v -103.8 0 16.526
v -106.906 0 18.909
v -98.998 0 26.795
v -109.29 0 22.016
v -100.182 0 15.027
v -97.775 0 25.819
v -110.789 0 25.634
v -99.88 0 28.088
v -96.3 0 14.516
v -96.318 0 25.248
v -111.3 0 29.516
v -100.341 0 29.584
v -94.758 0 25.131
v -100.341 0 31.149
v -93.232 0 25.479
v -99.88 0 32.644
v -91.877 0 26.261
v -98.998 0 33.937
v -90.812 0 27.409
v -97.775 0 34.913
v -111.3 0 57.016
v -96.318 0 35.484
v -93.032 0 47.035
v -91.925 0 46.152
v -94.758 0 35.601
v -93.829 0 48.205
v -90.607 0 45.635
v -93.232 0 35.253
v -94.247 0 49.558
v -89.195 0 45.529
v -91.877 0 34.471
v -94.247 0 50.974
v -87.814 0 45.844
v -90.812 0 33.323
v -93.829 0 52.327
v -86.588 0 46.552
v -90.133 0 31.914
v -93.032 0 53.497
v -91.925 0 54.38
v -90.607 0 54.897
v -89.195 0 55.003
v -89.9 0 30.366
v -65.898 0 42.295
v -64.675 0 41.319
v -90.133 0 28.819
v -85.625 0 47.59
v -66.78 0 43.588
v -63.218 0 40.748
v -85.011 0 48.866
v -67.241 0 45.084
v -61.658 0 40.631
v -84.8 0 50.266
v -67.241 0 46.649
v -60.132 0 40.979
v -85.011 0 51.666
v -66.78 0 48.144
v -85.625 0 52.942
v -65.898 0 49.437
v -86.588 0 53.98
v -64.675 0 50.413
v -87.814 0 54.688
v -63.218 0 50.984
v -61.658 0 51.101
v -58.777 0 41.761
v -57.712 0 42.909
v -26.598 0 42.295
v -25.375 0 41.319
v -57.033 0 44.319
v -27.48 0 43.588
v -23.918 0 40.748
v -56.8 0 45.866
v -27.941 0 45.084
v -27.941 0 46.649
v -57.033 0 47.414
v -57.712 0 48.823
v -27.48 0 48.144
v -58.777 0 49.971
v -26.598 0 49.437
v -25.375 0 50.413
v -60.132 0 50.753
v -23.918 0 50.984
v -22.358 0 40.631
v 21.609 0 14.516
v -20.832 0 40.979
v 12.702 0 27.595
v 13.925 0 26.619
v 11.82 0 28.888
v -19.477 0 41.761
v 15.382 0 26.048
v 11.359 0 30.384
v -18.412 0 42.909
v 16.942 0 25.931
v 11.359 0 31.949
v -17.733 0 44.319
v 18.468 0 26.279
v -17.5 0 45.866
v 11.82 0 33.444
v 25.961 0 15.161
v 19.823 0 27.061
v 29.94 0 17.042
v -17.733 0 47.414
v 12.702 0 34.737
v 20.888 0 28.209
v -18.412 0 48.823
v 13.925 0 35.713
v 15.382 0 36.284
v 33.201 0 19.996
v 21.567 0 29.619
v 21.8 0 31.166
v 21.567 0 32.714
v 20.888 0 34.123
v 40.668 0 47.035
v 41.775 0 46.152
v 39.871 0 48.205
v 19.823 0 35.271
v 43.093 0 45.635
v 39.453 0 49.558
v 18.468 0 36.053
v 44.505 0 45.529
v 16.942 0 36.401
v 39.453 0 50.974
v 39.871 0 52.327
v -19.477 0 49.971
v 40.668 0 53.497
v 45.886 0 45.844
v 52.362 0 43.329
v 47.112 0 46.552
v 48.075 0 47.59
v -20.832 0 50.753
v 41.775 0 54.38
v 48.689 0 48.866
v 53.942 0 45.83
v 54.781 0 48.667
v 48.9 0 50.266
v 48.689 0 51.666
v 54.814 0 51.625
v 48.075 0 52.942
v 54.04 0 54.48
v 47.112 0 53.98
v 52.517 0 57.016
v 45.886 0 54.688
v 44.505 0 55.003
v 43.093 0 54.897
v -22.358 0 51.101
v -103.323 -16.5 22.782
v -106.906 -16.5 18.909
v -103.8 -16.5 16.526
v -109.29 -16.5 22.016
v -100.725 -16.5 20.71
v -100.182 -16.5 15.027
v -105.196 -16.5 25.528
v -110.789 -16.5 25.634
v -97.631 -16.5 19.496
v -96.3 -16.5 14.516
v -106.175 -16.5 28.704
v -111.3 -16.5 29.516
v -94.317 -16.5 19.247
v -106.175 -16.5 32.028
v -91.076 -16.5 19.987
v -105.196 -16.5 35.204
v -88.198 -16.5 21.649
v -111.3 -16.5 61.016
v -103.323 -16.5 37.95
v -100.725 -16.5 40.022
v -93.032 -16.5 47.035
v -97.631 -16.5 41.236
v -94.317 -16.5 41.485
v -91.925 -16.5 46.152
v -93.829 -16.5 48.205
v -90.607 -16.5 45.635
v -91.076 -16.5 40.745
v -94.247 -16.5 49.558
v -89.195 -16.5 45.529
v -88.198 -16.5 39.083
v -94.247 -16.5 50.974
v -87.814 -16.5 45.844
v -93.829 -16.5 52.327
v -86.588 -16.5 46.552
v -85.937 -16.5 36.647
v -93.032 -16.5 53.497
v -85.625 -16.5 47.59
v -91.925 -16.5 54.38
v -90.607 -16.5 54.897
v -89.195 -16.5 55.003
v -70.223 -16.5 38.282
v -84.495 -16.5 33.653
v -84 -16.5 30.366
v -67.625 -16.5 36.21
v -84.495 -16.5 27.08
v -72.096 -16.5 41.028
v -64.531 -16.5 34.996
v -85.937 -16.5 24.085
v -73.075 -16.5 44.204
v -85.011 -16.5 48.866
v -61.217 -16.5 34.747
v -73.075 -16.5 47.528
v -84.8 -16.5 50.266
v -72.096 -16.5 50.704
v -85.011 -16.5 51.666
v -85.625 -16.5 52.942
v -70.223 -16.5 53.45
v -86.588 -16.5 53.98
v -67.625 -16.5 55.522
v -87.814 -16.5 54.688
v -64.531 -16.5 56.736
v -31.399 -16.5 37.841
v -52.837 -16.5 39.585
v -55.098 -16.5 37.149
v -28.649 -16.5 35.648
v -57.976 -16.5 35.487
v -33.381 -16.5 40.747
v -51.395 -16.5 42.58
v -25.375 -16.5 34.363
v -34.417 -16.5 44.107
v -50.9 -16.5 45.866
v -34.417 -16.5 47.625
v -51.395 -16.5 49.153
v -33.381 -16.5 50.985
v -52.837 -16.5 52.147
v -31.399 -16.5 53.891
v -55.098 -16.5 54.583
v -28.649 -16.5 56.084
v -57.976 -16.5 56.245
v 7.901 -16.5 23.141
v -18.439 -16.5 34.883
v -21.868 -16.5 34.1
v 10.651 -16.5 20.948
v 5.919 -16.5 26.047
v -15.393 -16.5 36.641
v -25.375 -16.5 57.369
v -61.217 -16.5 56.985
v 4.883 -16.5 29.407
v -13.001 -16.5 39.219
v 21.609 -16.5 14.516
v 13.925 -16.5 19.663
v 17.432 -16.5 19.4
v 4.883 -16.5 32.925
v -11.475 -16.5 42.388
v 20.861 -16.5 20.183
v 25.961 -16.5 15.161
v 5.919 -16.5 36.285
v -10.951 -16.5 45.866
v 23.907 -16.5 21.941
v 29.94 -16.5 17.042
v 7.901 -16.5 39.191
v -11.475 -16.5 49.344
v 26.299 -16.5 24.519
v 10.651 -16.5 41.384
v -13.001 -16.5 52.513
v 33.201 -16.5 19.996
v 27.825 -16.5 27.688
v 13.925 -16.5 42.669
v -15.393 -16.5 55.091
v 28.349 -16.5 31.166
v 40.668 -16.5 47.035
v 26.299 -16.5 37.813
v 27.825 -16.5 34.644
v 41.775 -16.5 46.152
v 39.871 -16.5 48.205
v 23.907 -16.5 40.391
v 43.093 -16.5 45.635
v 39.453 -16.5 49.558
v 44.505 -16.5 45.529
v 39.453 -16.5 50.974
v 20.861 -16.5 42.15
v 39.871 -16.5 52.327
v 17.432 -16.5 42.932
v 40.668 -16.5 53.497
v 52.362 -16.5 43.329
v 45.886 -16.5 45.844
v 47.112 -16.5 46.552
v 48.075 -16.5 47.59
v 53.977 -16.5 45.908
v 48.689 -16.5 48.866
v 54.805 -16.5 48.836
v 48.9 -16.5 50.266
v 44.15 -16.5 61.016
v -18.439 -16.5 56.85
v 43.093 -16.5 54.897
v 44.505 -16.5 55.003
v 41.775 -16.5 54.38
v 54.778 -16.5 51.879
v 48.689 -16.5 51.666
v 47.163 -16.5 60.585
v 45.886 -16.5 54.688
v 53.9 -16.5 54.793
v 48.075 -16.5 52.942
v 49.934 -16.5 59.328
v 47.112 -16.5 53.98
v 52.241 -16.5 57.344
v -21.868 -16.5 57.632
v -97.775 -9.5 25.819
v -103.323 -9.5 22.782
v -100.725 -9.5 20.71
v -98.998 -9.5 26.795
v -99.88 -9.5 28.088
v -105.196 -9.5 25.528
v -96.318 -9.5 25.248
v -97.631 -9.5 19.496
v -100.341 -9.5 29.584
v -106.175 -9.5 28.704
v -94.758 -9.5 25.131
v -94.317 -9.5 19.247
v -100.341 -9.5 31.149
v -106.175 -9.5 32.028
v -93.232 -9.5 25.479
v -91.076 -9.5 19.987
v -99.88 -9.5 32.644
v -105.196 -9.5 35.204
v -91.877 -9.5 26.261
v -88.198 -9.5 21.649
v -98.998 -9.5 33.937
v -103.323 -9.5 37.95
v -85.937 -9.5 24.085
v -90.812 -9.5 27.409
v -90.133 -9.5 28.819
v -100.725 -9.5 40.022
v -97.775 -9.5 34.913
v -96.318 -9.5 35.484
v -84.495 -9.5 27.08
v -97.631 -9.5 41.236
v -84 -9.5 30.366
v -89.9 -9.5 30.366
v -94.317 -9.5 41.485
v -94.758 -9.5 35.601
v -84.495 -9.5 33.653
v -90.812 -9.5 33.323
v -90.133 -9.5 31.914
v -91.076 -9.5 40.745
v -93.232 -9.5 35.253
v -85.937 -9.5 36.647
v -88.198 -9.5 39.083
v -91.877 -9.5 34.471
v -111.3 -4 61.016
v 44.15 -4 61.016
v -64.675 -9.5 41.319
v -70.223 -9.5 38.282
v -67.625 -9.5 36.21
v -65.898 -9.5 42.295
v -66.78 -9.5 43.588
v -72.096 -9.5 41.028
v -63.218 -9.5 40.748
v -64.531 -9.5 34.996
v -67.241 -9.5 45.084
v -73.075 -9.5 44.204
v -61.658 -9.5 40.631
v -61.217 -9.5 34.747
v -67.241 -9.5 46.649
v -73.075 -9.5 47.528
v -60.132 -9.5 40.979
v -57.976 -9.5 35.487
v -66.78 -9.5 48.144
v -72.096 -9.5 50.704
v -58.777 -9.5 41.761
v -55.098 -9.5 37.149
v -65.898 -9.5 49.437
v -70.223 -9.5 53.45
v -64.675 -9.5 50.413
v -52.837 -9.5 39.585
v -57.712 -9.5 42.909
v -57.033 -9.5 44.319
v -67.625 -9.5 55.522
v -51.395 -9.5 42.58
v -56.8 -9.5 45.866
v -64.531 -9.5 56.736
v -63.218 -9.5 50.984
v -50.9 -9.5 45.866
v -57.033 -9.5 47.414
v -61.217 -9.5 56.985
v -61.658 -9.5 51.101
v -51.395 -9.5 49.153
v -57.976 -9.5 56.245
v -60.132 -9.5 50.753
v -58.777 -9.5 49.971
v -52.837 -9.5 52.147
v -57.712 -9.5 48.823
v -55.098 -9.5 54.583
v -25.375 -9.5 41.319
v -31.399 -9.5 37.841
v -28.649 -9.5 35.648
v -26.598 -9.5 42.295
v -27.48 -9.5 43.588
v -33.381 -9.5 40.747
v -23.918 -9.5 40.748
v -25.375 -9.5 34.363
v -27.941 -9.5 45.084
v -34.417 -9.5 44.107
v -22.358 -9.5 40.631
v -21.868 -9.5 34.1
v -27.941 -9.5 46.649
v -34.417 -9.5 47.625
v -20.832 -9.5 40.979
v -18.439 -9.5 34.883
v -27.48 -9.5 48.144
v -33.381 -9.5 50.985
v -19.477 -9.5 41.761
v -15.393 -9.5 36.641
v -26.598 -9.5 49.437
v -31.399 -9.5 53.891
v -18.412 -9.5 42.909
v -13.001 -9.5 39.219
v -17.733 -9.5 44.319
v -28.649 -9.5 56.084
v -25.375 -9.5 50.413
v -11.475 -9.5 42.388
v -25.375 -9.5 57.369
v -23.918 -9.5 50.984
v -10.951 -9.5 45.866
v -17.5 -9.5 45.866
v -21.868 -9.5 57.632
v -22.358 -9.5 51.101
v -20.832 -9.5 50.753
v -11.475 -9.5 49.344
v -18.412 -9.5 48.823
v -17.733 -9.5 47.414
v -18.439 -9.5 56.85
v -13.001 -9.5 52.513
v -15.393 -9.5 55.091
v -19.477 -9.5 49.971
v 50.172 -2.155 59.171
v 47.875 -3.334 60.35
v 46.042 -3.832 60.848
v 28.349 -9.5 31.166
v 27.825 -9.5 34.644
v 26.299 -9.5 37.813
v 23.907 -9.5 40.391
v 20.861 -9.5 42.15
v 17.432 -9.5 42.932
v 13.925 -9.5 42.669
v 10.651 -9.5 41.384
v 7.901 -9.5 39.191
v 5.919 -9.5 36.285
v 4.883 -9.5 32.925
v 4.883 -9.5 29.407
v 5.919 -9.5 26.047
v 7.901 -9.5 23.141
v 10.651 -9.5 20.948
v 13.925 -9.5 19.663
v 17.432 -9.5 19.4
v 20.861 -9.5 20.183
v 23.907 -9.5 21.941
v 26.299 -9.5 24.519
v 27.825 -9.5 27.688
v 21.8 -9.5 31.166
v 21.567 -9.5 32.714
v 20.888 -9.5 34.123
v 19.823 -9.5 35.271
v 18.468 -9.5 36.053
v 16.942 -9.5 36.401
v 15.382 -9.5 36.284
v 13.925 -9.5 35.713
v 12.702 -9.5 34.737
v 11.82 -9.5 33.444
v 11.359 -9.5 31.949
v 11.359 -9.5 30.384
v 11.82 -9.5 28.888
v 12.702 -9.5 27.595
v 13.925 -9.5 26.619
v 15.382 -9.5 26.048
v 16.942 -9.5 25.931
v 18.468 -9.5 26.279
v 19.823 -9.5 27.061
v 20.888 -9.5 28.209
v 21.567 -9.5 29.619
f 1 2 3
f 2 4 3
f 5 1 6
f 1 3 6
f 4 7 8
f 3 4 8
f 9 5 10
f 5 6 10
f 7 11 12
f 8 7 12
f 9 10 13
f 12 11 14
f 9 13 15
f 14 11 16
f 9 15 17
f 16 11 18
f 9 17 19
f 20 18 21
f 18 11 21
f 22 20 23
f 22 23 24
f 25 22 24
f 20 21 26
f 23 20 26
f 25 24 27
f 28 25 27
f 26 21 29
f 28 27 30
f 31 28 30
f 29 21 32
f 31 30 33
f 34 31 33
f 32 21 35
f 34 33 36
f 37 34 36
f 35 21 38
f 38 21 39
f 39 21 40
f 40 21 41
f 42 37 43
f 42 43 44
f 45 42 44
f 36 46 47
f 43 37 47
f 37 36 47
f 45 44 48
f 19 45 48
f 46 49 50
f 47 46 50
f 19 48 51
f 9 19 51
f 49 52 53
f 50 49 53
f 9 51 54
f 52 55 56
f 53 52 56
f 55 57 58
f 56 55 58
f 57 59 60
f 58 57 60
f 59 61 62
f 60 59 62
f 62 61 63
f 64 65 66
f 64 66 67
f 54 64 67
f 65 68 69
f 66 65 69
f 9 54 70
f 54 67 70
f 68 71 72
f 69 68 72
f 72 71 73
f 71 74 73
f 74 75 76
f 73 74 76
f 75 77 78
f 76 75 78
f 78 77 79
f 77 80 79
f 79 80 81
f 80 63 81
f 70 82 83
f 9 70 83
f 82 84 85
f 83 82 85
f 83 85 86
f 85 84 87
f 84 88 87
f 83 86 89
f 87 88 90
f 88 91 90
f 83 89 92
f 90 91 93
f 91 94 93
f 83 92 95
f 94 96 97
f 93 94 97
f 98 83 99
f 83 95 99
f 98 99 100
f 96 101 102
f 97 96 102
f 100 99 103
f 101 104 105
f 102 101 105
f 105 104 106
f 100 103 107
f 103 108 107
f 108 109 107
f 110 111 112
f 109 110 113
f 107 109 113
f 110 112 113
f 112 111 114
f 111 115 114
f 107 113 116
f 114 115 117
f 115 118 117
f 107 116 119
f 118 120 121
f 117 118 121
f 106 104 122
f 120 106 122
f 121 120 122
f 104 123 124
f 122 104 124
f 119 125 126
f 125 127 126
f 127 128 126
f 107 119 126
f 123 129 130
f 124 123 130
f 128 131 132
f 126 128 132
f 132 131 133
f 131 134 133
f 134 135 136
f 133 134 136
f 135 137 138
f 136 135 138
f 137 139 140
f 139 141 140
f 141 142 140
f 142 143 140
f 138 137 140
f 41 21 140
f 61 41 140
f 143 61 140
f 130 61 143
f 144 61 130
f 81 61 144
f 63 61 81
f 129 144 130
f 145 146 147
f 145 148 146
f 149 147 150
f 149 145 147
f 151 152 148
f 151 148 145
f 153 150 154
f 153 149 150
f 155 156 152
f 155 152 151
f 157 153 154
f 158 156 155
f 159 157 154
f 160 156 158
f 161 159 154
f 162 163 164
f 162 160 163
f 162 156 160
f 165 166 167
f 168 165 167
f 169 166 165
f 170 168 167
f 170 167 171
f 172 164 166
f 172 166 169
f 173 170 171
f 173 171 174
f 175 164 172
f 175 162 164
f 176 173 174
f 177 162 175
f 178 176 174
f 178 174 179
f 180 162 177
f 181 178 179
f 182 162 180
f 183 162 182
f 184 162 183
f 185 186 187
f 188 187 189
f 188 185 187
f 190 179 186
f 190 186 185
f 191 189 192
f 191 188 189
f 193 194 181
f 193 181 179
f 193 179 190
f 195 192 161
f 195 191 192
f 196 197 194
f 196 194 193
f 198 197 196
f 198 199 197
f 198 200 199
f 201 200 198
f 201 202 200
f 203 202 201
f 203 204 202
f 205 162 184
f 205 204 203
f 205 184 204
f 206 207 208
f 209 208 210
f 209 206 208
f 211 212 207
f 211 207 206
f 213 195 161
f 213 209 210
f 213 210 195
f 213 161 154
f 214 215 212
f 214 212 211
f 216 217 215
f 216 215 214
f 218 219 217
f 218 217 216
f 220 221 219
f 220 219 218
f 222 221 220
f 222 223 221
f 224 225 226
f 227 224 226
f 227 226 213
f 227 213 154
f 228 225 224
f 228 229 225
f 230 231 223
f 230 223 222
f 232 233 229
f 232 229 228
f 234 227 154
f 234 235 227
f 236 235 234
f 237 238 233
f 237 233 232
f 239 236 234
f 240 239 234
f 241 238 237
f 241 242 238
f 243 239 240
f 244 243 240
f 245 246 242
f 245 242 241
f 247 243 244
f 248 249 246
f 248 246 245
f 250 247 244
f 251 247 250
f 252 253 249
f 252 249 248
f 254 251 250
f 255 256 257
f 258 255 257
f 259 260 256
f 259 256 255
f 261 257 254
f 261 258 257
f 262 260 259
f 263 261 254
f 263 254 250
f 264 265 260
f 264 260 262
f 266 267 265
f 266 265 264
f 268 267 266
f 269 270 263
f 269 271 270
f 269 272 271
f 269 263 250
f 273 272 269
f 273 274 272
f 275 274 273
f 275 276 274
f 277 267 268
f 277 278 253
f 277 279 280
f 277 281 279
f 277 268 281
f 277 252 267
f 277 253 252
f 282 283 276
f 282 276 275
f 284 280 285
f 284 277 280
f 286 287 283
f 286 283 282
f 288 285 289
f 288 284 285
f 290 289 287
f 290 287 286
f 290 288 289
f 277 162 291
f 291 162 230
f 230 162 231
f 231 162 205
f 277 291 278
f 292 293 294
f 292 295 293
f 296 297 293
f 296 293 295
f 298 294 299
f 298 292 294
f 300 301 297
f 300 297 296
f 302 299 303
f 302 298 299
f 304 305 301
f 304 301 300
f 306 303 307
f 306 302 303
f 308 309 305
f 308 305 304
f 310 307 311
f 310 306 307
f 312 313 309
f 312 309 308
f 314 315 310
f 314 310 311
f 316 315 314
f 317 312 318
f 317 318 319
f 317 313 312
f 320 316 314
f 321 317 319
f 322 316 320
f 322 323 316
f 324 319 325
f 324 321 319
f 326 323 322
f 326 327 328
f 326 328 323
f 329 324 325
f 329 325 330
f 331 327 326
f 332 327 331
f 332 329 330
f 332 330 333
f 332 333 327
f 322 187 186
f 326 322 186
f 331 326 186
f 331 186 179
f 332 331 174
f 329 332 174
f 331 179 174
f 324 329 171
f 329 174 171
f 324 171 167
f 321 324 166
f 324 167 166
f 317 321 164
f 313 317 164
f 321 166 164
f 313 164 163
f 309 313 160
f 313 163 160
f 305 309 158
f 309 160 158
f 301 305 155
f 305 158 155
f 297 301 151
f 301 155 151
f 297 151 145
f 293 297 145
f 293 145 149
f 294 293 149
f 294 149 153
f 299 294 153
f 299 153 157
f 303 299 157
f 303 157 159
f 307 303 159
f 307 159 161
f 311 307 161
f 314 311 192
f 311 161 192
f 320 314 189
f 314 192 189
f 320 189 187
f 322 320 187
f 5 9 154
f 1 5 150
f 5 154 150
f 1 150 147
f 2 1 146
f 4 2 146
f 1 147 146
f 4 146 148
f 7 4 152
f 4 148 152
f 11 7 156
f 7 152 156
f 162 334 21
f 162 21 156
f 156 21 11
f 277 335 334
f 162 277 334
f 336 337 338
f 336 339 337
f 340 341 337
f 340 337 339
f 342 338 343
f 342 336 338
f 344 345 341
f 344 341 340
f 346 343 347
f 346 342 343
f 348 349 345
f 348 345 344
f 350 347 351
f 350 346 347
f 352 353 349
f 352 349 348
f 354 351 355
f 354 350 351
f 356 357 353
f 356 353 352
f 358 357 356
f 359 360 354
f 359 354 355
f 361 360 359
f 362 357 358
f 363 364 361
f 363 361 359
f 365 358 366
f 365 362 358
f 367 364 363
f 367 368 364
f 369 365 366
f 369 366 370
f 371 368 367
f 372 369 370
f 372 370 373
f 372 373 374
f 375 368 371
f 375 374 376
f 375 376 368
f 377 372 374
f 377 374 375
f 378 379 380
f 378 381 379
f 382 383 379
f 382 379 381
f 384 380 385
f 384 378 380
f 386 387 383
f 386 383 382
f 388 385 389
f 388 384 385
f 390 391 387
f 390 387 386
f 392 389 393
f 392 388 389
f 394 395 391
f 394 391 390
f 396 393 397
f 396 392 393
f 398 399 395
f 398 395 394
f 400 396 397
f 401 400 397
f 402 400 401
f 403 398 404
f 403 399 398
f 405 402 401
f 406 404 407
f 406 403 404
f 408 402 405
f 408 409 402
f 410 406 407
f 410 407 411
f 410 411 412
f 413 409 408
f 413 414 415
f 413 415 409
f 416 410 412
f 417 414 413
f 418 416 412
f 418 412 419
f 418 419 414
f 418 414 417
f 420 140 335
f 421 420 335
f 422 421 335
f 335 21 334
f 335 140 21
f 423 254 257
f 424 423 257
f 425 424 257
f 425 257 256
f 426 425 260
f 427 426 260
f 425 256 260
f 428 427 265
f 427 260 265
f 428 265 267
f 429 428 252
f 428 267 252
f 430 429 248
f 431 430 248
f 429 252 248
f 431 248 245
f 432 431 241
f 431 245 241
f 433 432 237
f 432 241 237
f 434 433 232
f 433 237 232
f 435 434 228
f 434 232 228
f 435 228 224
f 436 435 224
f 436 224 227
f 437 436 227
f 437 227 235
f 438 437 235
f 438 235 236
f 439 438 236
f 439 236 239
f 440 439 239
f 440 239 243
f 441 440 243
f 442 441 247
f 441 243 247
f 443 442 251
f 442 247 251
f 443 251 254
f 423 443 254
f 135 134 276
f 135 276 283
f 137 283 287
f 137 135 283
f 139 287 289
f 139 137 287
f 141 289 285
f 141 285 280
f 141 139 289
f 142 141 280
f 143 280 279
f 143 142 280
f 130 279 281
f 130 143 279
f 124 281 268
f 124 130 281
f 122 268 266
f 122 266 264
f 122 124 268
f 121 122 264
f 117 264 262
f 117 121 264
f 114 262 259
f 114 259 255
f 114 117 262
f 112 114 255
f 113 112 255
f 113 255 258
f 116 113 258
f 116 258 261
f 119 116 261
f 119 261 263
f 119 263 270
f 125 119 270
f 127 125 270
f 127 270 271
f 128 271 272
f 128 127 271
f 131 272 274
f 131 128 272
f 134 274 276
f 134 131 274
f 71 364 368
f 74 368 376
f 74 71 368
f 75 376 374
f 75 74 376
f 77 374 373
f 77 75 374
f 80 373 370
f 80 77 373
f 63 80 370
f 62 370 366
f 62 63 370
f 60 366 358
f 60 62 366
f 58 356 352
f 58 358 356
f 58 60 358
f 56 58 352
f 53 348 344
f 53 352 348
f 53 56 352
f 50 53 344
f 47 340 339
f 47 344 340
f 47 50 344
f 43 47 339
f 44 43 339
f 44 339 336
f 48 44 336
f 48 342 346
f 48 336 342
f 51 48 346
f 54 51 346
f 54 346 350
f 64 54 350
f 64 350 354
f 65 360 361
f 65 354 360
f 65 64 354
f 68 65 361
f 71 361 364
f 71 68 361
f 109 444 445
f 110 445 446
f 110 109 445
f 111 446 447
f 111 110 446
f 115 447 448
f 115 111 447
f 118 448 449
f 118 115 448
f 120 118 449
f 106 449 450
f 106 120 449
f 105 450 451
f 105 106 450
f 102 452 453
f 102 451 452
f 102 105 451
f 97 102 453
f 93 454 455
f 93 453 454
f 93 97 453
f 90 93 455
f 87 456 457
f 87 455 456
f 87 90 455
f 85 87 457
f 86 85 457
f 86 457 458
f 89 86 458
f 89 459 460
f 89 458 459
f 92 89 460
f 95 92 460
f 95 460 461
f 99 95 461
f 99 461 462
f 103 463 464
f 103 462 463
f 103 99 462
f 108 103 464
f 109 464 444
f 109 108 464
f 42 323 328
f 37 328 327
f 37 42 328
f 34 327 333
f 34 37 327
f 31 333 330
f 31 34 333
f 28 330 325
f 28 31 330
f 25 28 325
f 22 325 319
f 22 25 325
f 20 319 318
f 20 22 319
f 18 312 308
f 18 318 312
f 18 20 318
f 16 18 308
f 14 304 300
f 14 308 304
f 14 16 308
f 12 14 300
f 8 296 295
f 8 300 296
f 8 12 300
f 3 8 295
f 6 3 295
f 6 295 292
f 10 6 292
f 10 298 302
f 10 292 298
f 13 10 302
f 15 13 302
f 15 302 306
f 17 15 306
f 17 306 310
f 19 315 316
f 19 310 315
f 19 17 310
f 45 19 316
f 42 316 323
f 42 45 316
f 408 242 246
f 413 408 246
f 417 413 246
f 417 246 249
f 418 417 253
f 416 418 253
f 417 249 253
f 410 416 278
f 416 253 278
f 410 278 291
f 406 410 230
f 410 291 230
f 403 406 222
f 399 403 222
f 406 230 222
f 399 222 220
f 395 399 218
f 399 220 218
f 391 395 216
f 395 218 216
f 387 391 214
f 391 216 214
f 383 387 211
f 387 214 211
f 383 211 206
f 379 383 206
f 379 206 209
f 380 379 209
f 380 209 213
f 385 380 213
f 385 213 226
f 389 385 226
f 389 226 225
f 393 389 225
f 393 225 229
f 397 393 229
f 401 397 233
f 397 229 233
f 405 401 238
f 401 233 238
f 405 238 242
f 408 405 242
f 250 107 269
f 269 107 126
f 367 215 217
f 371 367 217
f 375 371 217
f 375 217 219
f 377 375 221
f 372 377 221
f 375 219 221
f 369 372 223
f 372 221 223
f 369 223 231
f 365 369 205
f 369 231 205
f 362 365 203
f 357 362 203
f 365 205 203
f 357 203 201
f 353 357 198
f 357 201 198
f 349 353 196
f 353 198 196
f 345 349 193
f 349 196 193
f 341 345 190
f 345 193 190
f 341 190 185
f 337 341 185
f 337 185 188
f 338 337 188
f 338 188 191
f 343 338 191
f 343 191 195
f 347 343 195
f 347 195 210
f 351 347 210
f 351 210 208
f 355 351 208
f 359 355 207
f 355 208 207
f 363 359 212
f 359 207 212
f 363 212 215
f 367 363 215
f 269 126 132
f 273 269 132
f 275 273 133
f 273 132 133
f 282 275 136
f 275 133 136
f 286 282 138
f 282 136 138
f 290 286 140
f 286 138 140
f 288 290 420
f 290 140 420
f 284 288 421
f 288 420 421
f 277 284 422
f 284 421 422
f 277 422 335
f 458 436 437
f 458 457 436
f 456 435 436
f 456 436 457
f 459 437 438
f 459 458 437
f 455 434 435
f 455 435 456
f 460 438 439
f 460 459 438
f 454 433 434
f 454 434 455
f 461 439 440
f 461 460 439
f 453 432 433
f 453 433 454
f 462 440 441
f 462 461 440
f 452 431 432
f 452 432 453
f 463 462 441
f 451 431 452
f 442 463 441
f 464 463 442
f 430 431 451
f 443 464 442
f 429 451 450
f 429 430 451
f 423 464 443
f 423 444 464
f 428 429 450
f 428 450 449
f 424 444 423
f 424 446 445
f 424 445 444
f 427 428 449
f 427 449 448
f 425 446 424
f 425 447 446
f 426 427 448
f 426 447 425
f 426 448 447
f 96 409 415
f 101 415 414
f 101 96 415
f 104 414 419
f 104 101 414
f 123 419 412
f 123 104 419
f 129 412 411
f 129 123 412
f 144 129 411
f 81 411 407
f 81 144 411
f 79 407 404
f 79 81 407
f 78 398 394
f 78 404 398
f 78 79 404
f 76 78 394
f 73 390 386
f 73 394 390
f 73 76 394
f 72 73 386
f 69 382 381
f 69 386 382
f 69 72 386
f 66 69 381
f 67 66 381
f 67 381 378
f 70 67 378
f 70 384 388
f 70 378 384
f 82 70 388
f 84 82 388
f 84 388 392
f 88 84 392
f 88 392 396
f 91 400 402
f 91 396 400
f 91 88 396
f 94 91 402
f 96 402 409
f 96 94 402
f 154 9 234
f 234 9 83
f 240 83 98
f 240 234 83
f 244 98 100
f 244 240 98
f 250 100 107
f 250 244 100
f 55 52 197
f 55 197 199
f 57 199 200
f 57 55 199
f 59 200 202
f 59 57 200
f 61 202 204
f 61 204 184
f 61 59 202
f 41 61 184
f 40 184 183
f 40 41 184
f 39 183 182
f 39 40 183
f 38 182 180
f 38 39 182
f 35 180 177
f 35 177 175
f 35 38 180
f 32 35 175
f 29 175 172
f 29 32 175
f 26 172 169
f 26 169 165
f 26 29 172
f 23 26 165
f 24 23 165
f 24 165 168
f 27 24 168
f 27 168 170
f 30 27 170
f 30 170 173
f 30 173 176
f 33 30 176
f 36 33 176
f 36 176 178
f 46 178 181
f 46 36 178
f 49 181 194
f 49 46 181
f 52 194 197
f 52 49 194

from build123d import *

# Parameters (mm, degrees)
F0_R        = 5.25
F0_R_2      = 4.75
F1_DEPTH    = 16.5
F2_R        = 11.15
F2_R_2      = 11.7991480977
F3_DEPTH    = 7
F4_R        = 15
F5_R        = 15
F6_T1_DEPTH = 176.0234639037


# Not quite as in the source:
# - a fillet or chamfer that OpenCascade refuses, or shapes differently, is made with other operations: its cross-section is extruded or revolved along the edge and cut away or added


with BuildPart() as f1:
    # F0 (on Front) → F1 (new body)
    with BuildSketch(Plane.XZ):
        with BuildLine():
            Line((28.7001559958, 61.0160396297), (-111.2998440042, 61.0160396297))
            Line((-111.2998440042, 61.0160396297), (-111.2998440042, 14.5160396297))
            Line((-111.2998440042, 14.5160396297), (28.7001559958, 14.5160396297))
            Line((28.7001559958, 14.5160396297), (52.362193456, 43.3288254373))
            ThreePointArc((52.362193456, 43.3288254373), (53.9004778512, 54.793039046), (44.1501559958, 61.0160396297))
            Line((44.1501559958, 61.0160396297), (28.7001559958, 61.0160396297))
        make_face()
        with Locations((-95.1498440042, 30.3660396297)):
            Circle(F0_R, mode=Mode.SUBTRACT)
        with Locations((16.5501559958, 31.1660396297)):
            Circle(F0_R, mode=Mode.SUBTRACT)
        with Locations((-62.0498440042, 45.8660396297)):
            Circle(F0_R, mode=Mode.SUBTRACT)
        with Locations((-89.5498440042, 50.2660396297)):
            Circle(F0_R_2, mode=Mode.SUBTRACT)
        with Locations((-22.7498440042, 45.8660396297)):
            Circle(F0_R, mode=Mode.SUBTRACT)
        with Locations((44.1501559958, 50.2660396297)):
            Circle(F0_R_2, mode=Mode.SUBTRACT)
    extrude(amount=F1_DEPTH)

    # F2 (on face) → F3 (cut)
    with BuildSketch(Plane.XZ.offset(16.5)):
        with Locations((-95.1498440042, 30.3660396297)):
            Circle(F2_R)
        with Locations((-62.0498440042, 45.8660396297)):
            Circle(F2_R)
        with Locations((-22.7498440042, 45.8660396297)):
            Circle(F2_R_2)
        with Locations((16.5501559958, 31.1660396297)):
            Circle(F2_R_2)
    extrude(amount=-F3_DEPTH, mode=Mode.SUBTRACT)

    # F4
    f4_edges = [f1.edges().sort_by_distance(p)[0] for p in [
        (28.700156, -8.25, 14.51604),
    ]]
    fillet(f4_edges, radius=F4_R)

    # F5
    f5_edges = [f1.edges().sort_by_distance(p)[0] for p in [
        (-111.299844, -8.25, 14.51604),
    ]]
    fillet(f5_edges, radius=F5_R)

    # F6: chamfer of 4 on 1 edges, made by hand

    # F6_s2 → F6_t1 (cut)
    with BuildSketch(Plane.YZ.offset(-121.5865759561)):
        Polygon((0, 57.0160396297), (-4, 61.0160396297), (0, 61.0160396297), align=None)
    extrude(amount=F6_T1_DEPTH, mode=Mode.SUBTRACT)


solid = f1.part
